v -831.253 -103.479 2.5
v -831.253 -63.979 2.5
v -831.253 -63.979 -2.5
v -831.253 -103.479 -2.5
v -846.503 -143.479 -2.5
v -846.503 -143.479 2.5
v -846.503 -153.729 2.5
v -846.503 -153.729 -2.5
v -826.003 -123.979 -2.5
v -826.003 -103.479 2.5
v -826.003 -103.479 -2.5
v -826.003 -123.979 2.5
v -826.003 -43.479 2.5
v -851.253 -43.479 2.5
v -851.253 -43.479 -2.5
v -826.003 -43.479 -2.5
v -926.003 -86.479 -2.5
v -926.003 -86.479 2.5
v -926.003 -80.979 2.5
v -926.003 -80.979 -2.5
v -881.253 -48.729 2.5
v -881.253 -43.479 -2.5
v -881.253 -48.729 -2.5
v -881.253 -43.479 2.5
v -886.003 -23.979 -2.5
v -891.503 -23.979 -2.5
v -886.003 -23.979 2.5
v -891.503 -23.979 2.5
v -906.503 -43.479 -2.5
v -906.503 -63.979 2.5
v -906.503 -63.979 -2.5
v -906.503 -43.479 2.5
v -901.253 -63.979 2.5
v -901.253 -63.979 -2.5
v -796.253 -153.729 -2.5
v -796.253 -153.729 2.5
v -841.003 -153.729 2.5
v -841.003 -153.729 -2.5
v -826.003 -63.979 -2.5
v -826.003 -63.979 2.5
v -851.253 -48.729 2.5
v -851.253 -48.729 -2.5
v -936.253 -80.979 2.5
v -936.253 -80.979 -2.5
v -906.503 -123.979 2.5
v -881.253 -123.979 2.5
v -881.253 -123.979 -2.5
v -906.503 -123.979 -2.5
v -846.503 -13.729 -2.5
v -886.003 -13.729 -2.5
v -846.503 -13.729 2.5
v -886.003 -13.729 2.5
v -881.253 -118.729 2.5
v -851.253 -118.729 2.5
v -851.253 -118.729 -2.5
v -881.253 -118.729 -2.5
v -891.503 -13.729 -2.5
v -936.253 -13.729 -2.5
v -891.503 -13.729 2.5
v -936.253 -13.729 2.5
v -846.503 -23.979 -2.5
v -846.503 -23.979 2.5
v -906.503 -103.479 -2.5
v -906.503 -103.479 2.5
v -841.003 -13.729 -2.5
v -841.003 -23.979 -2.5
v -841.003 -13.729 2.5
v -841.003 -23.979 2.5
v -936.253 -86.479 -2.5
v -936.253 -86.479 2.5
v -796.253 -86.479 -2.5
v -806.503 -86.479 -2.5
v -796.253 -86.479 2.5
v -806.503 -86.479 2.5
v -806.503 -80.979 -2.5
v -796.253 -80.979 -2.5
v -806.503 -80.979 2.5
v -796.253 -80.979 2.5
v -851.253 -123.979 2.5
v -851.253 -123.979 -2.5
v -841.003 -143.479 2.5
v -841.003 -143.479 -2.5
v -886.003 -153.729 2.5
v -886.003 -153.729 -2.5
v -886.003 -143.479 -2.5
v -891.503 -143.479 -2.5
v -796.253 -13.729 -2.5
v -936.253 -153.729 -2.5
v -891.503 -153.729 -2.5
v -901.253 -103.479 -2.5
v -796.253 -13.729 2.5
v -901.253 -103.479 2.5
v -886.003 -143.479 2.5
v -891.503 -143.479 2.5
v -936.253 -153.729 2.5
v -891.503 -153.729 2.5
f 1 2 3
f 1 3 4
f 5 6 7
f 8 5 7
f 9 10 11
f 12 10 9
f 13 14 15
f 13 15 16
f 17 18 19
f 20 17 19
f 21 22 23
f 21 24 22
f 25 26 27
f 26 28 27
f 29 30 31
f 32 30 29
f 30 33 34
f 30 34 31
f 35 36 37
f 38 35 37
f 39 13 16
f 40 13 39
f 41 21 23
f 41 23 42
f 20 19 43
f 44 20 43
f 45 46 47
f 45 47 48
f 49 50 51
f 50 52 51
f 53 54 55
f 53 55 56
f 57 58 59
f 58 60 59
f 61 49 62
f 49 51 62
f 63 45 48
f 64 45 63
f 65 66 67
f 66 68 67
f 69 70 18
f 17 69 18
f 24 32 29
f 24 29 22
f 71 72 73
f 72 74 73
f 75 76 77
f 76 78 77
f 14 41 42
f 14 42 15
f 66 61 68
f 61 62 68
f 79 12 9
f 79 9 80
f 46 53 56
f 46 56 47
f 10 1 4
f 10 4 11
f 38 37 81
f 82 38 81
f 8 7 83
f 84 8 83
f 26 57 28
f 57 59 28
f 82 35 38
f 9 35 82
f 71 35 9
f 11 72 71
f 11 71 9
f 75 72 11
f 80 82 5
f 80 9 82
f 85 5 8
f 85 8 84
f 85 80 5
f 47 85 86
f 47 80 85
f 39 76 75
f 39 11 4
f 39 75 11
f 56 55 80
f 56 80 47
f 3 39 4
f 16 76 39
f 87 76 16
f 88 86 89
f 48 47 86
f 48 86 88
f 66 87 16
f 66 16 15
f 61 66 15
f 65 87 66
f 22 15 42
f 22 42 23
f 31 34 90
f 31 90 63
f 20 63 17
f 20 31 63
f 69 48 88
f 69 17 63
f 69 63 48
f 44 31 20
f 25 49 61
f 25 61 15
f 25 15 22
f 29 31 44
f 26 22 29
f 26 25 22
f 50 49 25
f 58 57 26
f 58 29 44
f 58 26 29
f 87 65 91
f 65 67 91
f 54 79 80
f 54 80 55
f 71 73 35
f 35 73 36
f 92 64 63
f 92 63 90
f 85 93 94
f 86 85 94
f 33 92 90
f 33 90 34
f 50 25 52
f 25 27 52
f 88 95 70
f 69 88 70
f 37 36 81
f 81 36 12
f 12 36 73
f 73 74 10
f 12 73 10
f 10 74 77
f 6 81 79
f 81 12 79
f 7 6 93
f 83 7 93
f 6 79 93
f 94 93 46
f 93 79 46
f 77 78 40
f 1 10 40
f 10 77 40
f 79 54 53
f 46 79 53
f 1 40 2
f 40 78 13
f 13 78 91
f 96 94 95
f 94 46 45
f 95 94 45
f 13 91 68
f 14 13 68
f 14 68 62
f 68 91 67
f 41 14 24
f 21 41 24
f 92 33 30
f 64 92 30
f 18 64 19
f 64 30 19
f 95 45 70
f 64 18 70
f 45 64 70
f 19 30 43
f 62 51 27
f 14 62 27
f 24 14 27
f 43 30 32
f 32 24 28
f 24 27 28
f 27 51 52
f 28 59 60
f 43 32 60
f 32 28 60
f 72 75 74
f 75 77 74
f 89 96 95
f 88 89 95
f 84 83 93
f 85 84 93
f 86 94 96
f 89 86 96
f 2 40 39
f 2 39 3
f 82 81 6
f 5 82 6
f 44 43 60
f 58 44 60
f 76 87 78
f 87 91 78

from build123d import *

# Parameters (mm, degrees)
BOSS_EXTRUDE1_DEPTH = 2.5


with BuildPart() as part:
    # Sketch2 → Boss-Extrude1 (new, symmetric)
    with BuildSketch(Plane.XY):
        Polygon((-936.252975542, -80.979102057), (-936.252975542, -13.729117514), (-891.502975542, -13.729117514), (-891.502975542, -23.979117514), (-886.002975542, -23.979117514), (-886.002975542, -13.729117514), (-846.502975542, -13.729117514), (-846.502975542, -23.979117514), (-841.002975542, -23.979117514), (-841.002975542, -13.729117514), (-796.252975542, -13.729117514), (-796.252975542, -80.979102057), (-806.502975542, -80.979102057), (-806.502975542, -86.479102057), (-796.252975542, -86.479102057), (-796.252975542, -153.729086599), (-841.002975542, -153.729086599), (-841.002975542, -143.479086599), (-846.502975542, -143.479086599), (-846.502975542, -153.729086599), (-886.002975542, -153.729086599), (-886.002975542, -143.479086599), (-891.502975542, -143.479086599), (-891.502975542, -153.729086599), (-936.252975542, -153.729086599), (-936.252975542, -86.479102057), (-926.002975542, -86.479102057), (-926.002975542, -80.979102057), align=None)
        Polygon((-881.252975542, -43.479117514), (-881.252975542, -48.729117514), (-851.252975542, -48.729117514), (-851.252975542, -43.479117514), (-826.002975542, -43.479117514), (-826.002975542, -63.979117514), (-831.252975542, -63.979117514), (-831.252975542, -103.479086599), (-826.002975542, -103.479086599), (-826.002975542, -123.979086599), (-851.252975542, -123.979086599), (-851.252975542, -118.729086599), (-881.252975542, -118.729086599), (-881.252975542, -123.979086599), (-906.502975542, -123.979086599), (-906.502975542, -103.479086599), (-901.252975542, -103.479086599), (-901.252975542, -63.979117514), (-906.502975542, -63.979117514), (-906.502975542, -43.479117514), align=None, mode=Mode.SUBTRACT)
    extrude(amount=BOSS_EXTRUDE1_DEPTH, both=True)


solid = part.part
